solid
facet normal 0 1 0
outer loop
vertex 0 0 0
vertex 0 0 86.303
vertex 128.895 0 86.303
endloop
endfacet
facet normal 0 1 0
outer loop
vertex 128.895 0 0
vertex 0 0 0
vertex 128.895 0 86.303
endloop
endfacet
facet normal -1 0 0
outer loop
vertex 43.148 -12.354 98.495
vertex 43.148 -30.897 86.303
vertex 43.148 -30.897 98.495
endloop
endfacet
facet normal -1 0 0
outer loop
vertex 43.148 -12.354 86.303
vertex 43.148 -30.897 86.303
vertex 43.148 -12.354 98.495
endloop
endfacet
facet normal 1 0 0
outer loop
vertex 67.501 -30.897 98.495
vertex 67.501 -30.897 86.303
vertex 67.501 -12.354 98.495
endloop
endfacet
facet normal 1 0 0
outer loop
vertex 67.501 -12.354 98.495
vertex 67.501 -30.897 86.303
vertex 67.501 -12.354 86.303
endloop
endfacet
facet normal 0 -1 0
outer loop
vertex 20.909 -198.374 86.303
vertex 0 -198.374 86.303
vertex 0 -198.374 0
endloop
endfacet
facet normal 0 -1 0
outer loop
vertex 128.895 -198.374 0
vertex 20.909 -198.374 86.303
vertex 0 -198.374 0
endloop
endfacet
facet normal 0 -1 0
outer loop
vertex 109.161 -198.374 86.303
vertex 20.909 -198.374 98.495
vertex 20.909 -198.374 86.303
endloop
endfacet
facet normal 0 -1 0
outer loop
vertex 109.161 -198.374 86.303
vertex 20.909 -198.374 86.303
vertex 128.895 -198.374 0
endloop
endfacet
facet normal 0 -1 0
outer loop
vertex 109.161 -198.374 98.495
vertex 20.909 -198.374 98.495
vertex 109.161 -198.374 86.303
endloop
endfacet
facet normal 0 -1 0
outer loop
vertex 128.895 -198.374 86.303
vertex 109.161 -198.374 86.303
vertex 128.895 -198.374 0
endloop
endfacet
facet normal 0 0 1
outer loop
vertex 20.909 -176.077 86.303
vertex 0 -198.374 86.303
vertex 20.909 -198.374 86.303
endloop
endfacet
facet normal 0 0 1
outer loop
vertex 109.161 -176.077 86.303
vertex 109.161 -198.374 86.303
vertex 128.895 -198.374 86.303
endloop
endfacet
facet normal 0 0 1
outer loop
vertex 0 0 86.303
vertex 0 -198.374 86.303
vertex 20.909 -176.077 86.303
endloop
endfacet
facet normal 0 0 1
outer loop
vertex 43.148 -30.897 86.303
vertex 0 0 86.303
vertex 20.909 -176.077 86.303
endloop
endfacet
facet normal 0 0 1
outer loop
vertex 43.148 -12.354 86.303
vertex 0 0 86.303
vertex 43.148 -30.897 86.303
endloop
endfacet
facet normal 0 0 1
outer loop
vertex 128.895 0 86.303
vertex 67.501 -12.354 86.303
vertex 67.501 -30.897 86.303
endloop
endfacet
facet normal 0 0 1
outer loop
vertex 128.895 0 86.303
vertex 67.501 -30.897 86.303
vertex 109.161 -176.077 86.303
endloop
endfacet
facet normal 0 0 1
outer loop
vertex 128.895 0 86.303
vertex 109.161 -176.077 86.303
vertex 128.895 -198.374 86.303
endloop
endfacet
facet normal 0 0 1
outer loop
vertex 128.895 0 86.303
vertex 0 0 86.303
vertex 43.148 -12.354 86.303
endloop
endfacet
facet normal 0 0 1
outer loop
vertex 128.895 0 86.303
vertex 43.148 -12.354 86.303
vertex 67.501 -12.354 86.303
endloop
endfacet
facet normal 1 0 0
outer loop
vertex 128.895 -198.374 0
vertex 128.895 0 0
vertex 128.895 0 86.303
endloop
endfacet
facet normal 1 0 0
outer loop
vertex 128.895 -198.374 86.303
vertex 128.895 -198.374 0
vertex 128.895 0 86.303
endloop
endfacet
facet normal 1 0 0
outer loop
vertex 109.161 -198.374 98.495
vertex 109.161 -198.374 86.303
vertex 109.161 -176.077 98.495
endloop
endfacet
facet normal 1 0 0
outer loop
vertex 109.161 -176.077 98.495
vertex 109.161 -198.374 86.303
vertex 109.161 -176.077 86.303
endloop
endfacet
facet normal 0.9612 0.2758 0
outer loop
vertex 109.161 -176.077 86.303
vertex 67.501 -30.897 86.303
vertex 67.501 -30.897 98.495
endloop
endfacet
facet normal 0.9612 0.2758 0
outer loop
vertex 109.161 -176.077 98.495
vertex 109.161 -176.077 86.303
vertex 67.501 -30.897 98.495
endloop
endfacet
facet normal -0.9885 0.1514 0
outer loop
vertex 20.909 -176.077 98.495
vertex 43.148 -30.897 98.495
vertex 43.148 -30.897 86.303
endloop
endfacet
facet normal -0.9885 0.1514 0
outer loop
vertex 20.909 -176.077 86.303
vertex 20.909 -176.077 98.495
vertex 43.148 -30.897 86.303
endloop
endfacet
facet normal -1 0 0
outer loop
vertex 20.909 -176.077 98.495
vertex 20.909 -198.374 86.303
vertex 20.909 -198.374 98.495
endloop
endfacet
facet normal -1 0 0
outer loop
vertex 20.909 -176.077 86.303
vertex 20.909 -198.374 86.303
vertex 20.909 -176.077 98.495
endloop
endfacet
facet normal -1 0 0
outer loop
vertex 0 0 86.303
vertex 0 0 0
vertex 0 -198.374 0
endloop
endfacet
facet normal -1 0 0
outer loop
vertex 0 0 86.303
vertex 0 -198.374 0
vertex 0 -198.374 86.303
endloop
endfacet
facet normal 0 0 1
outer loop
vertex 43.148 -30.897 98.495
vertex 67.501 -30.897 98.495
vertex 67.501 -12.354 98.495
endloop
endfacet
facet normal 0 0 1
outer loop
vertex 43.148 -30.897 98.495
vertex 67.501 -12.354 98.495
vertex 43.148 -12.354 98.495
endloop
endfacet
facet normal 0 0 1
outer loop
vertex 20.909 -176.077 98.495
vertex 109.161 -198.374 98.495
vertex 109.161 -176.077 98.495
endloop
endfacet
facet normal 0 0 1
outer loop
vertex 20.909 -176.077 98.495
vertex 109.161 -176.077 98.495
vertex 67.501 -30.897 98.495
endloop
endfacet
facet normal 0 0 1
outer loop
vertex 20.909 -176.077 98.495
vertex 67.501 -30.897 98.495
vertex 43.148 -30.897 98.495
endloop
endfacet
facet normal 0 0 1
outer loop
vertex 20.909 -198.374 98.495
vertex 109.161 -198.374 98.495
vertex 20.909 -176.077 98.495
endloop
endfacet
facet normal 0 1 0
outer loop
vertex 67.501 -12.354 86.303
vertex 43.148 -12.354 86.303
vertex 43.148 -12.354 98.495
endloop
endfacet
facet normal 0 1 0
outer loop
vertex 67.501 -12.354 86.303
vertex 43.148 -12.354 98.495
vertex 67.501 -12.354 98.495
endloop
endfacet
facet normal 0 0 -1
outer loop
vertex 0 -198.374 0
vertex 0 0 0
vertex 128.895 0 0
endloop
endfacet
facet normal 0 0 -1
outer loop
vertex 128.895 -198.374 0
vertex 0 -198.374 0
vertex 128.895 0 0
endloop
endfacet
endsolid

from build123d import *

# Parameters (mm, degrees)
F0_W       = 128.8954913616
F0_H       = 86.3029435277
F1_DEPTH   = 198.374
F2_W       = 88.2518328726
F2_H       = 22.2966937294
F2_W_2     = 24.353325367
F2_H_2     = 18.542567268
F3_DEPTH   = 12.192
F3_FACE_W  = 24.353325367
F3_FACE_H  = 12.192
F3_FACE1_W = 88.2518328726
F3_FACE1_H = 12.192


with BuildPart() as f1:
    # F0 (on Front) → F1 (new body)
    with BuildSketch(Plane.XZ):
        with Locations((64.4477456808, 43.1514717638)):
            Rectangle(F0_W, F0_H)
    extrude(amount=F1_DEPTH)

    # F2 (on face) → F3 (join)
    with BuildSketch(Plane.XY.offset(86.3029435277)):
        with Locations((65.0349687785, -187.2256531353)):
            Rectangle(F2_W, F2_H)
        with Locations((55.3243383765, -21.625594236)):
            Rectangle(F2_W_2, F2_H_2)
    extrude(amount=F3_DEPTH)

    # F3_face (on face) → F4 section 0
    with BuildSketch(Plane(origin=(55.3243383765, -30.89687787, 92.3989435277), x_dir=(1, 0, 0), z_dir=(0, -1, 0))):
        Rectangle(F3_FACE_W, F3_FACE_H)
    # F3_face1 (on face) → F4 section 1
    with BuildSketch(Plane(origin=(65.0349687785, -176.0773062706, 92.3989435277), x_dir=(-1, 0, 0), z_dir=(0, 1, 0))):
        Rectangle(F3_FACE1_W, F3_FACE1_H)
    loft()


solid = f1.part
